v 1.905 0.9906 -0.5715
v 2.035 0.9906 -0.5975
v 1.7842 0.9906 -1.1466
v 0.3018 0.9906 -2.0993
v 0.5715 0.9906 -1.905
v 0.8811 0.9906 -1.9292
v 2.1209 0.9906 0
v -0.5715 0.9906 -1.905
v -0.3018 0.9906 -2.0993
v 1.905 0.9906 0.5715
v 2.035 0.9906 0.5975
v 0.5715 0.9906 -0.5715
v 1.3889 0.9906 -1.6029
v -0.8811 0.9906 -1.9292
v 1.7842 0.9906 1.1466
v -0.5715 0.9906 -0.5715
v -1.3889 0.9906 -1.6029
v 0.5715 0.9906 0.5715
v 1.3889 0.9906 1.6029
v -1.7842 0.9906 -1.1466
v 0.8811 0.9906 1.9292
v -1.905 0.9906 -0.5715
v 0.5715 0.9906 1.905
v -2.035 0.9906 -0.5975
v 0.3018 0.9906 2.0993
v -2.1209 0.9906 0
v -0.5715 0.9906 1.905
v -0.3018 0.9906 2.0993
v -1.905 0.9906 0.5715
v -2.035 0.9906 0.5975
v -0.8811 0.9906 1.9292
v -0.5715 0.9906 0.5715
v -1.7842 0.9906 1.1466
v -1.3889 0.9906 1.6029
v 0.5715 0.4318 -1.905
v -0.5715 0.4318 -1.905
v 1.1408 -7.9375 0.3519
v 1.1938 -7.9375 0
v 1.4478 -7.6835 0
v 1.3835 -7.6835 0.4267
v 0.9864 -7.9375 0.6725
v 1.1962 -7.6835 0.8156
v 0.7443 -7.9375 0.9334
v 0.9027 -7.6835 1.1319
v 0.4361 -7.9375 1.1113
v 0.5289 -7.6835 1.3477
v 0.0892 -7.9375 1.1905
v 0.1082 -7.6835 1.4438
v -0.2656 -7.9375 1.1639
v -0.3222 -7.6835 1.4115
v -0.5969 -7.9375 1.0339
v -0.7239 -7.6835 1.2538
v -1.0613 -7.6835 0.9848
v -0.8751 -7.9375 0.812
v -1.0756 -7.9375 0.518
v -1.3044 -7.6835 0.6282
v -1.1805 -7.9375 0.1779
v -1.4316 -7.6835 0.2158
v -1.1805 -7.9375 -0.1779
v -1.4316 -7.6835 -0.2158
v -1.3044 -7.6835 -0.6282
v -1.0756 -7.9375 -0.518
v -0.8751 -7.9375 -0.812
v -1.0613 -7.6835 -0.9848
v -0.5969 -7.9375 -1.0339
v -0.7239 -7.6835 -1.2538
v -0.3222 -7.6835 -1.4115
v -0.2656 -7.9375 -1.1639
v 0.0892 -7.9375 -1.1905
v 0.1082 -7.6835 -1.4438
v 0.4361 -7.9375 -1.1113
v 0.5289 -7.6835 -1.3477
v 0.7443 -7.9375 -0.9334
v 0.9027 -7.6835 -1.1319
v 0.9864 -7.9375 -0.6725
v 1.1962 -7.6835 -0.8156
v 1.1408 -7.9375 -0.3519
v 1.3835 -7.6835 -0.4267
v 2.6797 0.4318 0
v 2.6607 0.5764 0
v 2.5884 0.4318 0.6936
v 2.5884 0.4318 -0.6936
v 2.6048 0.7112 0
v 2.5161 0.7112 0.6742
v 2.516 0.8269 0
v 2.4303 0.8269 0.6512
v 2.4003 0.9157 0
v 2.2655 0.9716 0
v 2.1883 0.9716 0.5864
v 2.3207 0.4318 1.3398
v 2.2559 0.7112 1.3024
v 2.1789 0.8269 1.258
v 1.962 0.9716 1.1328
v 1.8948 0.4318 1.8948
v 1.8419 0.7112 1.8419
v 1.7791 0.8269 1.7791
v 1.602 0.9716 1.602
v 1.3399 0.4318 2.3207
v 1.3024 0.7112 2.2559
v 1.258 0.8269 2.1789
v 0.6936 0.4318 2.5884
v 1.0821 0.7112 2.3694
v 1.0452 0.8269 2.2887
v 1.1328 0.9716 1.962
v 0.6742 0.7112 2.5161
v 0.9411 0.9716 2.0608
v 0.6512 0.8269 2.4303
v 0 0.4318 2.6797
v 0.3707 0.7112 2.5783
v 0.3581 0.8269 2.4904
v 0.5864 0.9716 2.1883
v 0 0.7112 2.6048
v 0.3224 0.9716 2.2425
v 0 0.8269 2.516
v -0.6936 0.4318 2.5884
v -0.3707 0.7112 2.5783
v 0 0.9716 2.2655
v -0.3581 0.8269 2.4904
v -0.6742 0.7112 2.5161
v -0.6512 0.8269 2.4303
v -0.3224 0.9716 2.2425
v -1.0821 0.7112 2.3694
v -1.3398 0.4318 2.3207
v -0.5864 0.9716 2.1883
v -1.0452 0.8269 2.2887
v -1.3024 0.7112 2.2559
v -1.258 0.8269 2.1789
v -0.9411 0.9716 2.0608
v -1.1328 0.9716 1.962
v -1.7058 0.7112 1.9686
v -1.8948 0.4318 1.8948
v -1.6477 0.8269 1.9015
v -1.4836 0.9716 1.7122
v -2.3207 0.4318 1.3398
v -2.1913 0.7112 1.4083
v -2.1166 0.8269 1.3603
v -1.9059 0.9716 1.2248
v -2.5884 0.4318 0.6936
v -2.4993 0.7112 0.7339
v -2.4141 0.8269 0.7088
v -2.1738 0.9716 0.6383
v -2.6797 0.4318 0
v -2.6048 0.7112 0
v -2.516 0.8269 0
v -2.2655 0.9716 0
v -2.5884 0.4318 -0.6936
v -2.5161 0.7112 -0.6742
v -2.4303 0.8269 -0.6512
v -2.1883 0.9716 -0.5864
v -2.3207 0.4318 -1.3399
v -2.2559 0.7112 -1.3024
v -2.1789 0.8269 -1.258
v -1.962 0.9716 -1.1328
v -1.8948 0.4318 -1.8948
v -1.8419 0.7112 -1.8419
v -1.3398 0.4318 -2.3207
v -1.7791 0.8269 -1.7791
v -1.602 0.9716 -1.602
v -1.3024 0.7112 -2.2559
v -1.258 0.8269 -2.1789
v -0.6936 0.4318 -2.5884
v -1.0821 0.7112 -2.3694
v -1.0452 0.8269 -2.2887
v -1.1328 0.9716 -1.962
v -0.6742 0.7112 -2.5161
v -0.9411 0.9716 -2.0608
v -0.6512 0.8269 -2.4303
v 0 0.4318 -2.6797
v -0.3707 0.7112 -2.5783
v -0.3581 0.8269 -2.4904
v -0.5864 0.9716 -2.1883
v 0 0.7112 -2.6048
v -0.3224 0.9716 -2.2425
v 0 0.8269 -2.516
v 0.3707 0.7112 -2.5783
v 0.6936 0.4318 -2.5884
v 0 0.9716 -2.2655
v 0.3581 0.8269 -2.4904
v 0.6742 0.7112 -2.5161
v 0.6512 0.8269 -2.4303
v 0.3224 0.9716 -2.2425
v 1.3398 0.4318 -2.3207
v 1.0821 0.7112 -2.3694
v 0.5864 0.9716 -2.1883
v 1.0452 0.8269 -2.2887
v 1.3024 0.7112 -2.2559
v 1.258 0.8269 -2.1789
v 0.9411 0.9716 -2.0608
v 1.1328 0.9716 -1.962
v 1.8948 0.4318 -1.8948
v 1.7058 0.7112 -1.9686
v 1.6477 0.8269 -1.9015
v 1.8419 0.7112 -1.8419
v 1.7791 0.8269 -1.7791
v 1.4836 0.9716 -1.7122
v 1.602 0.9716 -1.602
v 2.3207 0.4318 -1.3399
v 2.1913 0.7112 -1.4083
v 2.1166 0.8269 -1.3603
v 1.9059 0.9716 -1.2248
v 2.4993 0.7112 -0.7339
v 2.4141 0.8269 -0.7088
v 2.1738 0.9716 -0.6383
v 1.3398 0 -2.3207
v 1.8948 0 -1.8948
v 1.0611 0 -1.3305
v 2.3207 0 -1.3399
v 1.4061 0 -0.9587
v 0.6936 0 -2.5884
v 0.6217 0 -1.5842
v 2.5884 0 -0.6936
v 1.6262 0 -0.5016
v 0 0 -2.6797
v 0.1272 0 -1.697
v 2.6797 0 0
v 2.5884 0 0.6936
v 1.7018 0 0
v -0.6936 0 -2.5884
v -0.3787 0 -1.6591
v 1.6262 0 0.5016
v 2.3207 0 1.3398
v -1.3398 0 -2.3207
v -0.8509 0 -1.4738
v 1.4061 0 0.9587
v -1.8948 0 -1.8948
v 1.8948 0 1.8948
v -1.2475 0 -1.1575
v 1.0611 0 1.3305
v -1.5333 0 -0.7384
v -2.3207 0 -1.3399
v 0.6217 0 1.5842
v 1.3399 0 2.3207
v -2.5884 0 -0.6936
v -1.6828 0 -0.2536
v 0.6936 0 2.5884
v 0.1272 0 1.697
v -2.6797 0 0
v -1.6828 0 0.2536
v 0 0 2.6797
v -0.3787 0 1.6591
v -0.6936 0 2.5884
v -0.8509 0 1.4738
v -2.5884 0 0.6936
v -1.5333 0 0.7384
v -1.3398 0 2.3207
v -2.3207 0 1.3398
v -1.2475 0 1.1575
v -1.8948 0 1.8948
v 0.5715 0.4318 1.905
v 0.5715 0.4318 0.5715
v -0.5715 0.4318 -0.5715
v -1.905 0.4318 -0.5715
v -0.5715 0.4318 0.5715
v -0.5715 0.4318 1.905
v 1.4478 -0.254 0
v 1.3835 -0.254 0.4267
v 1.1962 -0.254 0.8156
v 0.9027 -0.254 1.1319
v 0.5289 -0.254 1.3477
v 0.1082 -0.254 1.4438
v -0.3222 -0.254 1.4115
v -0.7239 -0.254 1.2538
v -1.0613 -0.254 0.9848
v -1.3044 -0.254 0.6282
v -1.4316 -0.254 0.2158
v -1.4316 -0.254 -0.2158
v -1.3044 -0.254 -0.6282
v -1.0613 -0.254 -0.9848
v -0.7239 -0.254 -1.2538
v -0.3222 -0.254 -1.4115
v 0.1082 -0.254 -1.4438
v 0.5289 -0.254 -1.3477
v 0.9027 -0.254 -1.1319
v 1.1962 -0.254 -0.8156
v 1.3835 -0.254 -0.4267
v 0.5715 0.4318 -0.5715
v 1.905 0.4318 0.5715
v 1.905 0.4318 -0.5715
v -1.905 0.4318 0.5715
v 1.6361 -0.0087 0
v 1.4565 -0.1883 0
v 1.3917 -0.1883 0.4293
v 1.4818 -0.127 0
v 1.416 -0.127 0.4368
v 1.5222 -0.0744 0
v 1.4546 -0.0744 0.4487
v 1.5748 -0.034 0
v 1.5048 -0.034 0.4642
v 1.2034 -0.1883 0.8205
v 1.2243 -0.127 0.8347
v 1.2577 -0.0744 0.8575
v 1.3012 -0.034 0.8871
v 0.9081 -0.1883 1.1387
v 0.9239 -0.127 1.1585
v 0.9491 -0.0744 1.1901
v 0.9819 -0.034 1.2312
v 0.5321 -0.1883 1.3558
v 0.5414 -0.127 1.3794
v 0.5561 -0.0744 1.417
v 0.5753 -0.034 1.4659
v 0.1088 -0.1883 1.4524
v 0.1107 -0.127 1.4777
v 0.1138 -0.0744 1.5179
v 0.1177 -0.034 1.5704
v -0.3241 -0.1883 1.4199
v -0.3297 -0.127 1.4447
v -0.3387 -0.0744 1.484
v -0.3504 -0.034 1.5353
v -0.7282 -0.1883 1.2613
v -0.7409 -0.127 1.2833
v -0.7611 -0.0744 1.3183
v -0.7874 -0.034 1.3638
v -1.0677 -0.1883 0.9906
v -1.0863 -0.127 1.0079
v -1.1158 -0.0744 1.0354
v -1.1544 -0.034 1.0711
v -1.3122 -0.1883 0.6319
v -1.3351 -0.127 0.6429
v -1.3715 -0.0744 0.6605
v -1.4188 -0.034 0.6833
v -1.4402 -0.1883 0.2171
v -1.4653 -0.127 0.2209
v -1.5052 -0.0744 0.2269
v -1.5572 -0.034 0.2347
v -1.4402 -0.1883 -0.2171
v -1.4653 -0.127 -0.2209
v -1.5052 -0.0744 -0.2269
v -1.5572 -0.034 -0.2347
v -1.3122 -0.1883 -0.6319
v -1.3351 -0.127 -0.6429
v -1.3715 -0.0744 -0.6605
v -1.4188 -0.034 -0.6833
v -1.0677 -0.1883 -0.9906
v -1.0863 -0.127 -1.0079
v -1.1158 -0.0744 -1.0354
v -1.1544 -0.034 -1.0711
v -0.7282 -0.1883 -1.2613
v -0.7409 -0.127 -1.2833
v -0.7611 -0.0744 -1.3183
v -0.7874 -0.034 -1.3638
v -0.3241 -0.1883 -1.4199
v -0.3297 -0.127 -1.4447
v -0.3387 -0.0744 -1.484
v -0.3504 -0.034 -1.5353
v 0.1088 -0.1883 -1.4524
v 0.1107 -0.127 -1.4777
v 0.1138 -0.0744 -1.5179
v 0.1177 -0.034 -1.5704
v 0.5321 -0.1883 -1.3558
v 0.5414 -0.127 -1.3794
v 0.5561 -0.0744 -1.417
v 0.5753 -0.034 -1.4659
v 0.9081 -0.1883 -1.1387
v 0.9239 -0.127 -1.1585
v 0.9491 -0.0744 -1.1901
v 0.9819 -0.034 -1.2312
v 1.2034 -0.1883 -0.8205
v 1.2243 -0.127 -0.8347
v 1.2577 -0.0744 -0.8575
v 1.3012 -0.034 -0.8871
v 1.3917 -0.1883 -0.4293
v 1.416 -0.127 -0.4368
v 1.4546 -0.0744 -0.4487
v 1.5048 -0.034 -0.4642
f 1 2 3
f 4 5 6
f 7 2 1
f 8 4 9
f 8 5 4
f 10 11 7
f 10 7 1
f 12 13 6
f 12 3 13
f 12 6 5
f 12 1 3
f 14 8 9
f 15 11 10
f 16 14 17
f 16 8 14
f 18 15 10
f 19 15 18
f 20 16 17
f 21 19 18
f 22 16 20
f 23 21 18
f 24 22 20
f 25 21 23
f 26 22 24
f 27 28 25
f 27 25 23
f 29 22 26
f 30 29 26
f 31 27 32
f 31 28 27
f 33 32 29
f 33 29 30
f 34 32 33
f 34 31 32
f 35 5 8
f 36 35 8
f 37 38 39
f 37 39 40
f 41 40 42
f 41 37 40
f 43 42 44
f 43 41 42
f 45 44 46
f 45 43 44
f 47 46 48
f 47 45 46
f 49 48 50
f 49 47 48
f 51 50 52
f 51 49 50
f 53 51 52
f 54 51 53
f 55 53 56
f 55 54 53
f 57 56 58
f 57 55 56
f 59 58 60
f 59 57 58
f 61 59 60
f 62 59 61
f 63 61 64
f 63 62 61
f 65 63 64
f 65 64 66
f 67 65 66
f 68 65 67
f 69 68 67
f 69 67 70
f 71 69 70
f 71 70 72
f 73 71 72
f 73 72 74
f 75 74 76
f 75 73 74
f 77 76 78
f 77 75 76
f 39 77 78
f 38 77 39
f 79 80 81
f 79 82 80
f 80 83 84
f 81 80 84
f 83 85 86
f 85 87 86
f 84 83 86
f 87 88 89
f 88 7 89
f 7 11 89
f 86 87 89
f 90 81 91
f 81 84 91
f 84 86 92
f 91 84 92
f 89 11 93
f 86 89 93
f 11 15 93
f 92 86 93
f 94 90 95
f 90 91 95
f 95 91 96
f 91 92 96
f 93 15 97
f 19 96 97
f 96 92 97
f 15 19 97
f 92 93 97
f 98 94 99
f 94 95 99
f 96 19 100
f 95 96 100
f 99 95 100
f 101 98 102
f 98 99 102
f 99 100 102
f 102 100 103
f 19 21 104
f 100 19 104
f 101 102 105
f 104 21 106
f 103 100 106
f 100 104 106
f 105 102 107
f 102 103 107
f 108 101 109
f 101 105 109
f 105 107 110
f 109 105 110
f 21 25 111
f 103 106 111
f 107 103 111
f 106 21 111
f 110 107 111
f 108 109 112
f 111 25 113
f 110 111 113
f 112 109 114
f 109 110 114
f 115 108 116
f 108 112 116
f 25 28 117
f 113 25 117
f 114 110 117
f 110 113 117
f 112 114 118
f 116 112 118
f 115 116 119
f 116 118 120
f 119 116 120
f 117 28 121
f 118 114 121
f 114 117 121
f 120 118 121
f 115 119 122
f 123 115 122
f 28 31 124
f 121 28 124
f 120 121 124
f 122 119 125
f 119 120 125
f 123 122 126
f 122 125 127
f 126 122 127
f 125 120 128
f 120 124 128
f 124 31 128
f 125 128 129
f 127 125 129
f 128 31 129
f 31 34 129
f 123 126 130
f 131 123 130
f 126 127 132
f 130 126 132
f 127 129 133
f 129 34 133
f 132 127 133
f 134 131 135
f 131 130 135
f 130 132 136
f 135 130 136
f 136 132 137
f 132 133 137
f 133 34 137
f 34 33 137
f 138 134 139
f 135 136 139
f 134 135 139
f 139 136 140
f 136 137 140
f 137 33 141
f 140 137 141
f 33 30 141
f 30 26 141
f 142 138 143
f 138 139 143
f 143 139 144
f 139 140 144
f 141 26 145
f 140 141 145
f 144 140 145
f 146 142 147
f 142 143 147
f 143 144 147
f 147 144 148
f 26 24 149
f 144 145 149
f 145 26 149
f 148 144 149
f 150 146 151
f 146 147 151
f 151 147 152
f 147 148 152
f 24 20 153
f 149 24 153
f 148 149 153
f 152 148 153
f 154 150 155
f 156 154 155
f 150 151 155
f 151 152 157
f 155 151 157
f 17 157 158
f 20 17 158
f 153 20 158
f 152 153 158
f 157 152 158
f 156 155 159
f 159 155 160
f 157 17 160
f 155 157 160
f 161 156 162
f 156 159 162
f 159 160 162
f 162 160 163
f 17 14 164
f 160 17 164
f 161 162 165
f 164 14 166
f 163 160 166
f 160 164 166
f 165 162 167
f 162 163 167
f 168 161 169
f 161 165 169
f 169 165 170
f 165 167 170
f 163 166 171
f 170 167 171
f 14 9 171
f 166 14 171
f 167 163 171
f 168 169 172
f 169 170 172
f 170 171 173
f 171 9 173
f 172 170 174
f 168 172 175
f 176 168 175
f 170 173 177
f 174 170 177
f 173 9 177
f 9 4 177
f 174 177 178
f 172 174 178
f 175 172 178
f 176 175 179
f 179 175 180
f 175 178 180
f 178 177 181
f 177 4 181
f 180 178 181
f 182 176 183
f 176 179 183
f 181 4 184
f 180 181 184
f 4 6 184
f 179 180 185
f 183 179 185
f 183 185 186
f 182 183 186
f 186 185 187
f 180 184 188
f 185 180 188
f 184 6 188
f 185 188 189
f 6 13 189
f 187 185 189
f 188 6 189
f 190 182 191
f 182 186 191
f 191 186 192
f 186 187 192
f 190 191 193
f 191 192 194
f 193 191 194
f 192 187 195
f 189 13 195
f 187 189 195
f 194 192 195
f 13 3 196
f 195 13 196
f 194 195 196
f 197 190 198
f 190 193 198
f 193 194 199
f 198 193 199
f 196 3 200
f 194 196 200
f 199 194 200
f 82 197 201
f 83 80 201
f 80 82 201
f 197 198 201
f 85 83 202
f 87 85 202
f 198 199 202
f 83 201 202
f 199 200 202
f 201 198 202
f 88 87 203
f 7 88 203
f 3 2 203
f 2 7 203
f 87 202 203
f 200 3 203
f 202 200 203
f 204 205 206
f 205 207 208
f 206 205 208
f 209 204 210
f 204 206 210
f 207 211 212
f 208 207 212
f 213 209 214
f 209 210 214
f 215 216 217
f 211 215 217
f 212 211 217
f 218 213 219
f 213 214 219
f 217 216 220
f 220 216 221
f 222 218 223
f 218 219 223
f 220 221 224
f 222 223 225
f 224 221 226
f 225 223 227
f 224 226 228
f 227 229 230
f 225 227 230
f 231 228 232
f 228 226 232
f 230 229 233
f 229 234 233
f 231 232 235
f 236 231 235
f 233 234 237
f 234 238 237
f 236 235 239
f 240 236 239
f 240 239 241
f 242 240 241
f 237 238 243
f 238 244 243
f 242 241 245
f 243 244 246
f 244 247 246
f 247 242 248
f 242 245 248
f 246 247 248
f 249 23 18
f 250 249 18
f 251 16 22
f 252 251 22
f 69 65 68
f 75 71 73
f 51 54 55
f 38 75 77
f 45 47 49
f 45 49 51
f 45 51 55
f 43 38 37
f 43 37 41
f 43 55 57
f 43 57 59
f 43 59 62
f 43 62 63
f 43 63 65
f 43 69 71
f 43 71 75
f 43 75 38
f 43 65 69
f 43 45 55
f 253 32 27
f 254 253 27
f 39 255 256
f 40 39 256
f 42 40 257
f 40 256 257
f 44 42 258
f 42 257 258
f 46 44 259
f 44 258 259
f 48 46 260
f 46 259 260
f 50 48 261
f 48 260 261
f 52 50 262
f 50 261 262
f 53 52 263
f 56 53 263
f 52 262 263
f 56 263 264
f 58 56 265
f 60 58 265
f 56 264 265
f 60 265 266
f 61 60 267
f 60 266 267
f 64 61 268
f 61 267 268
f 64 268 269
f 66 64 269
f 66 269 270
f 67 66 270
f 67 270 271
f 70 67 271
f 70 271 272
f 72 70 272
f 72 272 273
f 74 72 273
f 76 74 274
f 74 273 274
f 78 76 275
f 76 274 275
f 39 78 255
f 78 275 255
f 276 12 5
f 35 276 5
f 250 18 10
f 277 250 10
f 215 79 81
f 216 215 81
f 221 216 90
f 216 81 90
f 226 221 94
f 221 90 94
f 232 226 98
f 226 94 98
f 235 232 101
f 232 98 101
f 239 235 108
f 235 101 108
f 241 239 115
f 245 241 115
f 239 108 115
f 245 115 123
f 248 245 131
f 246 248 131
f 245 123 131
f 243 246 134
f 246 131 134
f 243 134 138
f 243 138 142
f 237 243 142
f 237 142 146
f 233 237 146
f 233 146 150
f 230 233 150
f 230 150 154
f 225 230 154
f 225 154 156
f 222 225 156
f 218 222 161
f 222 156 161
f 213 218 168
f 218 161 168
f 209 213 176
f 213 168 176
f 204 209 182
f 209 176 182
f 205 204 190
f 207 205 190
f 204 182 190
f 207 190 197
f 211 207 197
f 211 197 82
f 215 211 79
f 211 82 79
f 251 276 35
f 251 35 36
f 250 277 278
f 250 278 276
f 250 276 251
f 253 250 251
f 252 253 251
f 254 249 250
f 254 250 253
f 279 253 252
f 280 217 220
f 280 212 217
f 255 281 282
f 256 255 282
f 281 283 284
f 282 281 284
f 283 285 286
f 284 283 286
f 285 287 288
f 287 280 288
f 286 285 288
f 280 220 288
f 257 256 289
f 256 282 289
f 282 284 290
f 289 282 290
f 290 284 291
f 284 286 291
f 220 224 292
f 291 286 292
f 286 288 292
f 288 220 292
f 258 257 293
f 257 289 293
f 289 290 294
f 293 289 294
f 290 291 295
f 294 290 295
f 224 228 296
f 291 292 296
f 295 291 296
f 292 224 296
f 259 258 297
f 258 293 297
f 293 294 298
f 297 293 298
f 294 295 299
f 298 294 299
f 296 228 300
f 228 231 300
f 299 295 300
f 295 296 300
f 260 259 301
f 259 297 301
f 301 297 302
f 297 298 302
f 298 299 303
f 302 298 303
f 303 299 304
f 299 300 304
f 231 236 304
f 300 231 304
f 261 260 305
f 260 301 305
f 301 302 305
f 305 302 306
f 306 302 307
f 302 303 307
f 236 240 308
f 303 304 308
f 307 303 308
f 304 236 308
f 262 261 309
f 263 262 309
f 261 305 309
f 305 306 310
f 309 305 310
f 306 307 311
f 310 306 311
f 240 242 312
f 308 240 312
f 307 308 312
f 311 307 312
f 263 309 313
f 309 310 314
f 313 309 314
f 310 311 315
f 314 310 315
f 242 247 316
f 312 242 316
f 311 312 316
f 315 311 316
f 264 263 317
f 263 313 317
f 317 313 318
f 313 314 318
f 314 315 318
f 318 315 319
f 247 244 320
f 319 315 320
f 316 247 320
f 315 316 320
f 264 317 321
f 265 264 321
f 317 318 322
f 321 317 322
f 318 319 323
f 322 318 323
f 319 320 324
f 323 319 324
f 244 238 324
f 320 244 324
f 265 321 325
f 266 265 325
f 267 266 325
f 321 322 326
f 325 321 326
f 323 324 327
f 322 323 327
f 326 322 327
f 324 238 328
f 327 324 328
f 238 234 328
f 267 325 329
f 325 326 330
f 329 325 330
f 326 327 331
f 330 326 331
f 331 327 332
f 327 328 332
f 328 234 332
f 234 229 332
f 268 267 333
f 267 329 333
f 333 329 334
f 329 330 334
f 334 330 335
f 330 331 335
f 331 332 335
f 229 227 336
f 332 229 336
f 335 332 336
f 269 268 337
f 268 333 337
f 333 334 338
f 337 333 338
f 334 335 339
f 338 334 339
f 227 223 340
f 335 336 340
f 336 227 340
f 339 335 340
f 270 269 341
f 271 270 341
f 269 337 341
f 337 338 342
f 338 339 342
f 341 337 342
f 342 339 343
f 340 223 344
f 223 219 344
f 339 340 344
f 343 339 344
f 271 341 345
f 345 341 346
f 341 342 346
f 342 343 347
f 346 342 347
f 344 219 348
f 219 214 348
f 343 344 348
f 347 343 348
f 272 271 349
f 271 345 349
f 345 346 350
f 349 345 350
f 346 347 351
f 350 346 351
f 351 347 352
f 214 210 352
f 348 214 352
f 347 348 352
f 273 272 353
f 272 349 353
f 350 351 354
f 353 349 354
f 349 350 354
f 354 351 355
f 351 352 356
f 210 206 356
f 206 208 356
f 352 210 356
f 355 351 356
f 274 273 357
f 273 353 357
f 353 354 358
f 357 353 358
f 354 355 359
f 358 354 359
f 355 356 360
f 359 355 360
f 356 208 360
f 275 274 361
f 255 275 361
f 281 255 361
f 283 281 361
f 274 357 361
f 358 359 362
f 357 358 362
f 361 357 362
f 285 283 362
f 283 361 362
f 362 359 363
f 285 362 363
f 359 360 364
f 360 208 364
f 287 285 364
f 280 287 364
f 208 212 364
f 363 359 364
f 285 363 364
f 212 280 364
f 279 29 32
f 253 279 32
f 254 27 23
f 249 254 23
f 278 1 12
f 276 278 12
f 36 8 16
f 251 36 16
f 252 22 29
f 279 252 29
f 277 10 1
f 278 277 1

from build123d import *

# Parameters (mm, degrees)
SKETCH1_W           = 2.6797
SKETCH1_H           = 0.9906
SKETCH2_R           = 1.4478
BOSS_EXTRUDE1_DEPTH = 7.9375
CUT_EXTRUDE1_DEPTH  = 0.5588
CHAMFER1_SIZE       = 0.254
FILLET1_R           = 0.254
FILLET2_R           = 0.5588


with BuildPart() as part:
    # Sketch1 → Revolve1 (revolve)
    with BuildSketch(Plane.XY):
        with Locations((1.33985, 0.4953)):
            Rectangle(SKETCH1_W, SKETCH1_H)
    revolve(axis=Axis((0, 0.9906, 0), (0, -1, 0)))

    # Sketch2 → Boss-Extrude1 (add)
    with BuildSketch(Plane.XZ):
        Circle(SKETCH2_R)
    extrude(amount=BOSS_EXTRUDE1_DEPTH)

    # Sketch3 → Cut-Extrude1 (cut)
    with BuildSketch(Plane(origin=(0, 0.9906, 0), x_dir=(-1, 0, 0), z_dir=(0, 1, 0))):
        Polygon((-0.5715, -0.5715), (-0.5715, -1.905), (0.5715, -1.905), (0.5715, -0.5715), (1.905, -0.5715), (1.905, 0.5715), (0.5715, 0.5715), (0.5715, 1.905), (-0.5715, 1.905), (-0.5715, 0.5715), (-1.905, 0.5715), (-1.905, -0.5715), align=None)
    extrude(amount=-CUT_EXTRUDE1_DEPTH, mode=Mode.SUBTRACT)

    # Chamfer1
    chamfer1_edges = [part.edges().sort_by_distance(p)[0] for p in [
        (-1.4478, -7.9375, 0),
    ]]
    chamfer(chamfer1_edges, length=CHAMFER1_SIZE)

    # Fillet1
    fillet1_edges = [part.edges().sort_by_distance(p)[0] for p in [
        (-1.4478, 0, 0),
    ]]
    fillet(fillet1_edges, radius=FILLET1_R)

    # Fillet2
    fillet2_edges = [part.edges().sort_by_distance(p)[0] for p in [
        (-2.6797, 0.9906, 0),
    ]]
    fillet(fillet2_edges, radius=FILLET2_R)


solid = part.part
